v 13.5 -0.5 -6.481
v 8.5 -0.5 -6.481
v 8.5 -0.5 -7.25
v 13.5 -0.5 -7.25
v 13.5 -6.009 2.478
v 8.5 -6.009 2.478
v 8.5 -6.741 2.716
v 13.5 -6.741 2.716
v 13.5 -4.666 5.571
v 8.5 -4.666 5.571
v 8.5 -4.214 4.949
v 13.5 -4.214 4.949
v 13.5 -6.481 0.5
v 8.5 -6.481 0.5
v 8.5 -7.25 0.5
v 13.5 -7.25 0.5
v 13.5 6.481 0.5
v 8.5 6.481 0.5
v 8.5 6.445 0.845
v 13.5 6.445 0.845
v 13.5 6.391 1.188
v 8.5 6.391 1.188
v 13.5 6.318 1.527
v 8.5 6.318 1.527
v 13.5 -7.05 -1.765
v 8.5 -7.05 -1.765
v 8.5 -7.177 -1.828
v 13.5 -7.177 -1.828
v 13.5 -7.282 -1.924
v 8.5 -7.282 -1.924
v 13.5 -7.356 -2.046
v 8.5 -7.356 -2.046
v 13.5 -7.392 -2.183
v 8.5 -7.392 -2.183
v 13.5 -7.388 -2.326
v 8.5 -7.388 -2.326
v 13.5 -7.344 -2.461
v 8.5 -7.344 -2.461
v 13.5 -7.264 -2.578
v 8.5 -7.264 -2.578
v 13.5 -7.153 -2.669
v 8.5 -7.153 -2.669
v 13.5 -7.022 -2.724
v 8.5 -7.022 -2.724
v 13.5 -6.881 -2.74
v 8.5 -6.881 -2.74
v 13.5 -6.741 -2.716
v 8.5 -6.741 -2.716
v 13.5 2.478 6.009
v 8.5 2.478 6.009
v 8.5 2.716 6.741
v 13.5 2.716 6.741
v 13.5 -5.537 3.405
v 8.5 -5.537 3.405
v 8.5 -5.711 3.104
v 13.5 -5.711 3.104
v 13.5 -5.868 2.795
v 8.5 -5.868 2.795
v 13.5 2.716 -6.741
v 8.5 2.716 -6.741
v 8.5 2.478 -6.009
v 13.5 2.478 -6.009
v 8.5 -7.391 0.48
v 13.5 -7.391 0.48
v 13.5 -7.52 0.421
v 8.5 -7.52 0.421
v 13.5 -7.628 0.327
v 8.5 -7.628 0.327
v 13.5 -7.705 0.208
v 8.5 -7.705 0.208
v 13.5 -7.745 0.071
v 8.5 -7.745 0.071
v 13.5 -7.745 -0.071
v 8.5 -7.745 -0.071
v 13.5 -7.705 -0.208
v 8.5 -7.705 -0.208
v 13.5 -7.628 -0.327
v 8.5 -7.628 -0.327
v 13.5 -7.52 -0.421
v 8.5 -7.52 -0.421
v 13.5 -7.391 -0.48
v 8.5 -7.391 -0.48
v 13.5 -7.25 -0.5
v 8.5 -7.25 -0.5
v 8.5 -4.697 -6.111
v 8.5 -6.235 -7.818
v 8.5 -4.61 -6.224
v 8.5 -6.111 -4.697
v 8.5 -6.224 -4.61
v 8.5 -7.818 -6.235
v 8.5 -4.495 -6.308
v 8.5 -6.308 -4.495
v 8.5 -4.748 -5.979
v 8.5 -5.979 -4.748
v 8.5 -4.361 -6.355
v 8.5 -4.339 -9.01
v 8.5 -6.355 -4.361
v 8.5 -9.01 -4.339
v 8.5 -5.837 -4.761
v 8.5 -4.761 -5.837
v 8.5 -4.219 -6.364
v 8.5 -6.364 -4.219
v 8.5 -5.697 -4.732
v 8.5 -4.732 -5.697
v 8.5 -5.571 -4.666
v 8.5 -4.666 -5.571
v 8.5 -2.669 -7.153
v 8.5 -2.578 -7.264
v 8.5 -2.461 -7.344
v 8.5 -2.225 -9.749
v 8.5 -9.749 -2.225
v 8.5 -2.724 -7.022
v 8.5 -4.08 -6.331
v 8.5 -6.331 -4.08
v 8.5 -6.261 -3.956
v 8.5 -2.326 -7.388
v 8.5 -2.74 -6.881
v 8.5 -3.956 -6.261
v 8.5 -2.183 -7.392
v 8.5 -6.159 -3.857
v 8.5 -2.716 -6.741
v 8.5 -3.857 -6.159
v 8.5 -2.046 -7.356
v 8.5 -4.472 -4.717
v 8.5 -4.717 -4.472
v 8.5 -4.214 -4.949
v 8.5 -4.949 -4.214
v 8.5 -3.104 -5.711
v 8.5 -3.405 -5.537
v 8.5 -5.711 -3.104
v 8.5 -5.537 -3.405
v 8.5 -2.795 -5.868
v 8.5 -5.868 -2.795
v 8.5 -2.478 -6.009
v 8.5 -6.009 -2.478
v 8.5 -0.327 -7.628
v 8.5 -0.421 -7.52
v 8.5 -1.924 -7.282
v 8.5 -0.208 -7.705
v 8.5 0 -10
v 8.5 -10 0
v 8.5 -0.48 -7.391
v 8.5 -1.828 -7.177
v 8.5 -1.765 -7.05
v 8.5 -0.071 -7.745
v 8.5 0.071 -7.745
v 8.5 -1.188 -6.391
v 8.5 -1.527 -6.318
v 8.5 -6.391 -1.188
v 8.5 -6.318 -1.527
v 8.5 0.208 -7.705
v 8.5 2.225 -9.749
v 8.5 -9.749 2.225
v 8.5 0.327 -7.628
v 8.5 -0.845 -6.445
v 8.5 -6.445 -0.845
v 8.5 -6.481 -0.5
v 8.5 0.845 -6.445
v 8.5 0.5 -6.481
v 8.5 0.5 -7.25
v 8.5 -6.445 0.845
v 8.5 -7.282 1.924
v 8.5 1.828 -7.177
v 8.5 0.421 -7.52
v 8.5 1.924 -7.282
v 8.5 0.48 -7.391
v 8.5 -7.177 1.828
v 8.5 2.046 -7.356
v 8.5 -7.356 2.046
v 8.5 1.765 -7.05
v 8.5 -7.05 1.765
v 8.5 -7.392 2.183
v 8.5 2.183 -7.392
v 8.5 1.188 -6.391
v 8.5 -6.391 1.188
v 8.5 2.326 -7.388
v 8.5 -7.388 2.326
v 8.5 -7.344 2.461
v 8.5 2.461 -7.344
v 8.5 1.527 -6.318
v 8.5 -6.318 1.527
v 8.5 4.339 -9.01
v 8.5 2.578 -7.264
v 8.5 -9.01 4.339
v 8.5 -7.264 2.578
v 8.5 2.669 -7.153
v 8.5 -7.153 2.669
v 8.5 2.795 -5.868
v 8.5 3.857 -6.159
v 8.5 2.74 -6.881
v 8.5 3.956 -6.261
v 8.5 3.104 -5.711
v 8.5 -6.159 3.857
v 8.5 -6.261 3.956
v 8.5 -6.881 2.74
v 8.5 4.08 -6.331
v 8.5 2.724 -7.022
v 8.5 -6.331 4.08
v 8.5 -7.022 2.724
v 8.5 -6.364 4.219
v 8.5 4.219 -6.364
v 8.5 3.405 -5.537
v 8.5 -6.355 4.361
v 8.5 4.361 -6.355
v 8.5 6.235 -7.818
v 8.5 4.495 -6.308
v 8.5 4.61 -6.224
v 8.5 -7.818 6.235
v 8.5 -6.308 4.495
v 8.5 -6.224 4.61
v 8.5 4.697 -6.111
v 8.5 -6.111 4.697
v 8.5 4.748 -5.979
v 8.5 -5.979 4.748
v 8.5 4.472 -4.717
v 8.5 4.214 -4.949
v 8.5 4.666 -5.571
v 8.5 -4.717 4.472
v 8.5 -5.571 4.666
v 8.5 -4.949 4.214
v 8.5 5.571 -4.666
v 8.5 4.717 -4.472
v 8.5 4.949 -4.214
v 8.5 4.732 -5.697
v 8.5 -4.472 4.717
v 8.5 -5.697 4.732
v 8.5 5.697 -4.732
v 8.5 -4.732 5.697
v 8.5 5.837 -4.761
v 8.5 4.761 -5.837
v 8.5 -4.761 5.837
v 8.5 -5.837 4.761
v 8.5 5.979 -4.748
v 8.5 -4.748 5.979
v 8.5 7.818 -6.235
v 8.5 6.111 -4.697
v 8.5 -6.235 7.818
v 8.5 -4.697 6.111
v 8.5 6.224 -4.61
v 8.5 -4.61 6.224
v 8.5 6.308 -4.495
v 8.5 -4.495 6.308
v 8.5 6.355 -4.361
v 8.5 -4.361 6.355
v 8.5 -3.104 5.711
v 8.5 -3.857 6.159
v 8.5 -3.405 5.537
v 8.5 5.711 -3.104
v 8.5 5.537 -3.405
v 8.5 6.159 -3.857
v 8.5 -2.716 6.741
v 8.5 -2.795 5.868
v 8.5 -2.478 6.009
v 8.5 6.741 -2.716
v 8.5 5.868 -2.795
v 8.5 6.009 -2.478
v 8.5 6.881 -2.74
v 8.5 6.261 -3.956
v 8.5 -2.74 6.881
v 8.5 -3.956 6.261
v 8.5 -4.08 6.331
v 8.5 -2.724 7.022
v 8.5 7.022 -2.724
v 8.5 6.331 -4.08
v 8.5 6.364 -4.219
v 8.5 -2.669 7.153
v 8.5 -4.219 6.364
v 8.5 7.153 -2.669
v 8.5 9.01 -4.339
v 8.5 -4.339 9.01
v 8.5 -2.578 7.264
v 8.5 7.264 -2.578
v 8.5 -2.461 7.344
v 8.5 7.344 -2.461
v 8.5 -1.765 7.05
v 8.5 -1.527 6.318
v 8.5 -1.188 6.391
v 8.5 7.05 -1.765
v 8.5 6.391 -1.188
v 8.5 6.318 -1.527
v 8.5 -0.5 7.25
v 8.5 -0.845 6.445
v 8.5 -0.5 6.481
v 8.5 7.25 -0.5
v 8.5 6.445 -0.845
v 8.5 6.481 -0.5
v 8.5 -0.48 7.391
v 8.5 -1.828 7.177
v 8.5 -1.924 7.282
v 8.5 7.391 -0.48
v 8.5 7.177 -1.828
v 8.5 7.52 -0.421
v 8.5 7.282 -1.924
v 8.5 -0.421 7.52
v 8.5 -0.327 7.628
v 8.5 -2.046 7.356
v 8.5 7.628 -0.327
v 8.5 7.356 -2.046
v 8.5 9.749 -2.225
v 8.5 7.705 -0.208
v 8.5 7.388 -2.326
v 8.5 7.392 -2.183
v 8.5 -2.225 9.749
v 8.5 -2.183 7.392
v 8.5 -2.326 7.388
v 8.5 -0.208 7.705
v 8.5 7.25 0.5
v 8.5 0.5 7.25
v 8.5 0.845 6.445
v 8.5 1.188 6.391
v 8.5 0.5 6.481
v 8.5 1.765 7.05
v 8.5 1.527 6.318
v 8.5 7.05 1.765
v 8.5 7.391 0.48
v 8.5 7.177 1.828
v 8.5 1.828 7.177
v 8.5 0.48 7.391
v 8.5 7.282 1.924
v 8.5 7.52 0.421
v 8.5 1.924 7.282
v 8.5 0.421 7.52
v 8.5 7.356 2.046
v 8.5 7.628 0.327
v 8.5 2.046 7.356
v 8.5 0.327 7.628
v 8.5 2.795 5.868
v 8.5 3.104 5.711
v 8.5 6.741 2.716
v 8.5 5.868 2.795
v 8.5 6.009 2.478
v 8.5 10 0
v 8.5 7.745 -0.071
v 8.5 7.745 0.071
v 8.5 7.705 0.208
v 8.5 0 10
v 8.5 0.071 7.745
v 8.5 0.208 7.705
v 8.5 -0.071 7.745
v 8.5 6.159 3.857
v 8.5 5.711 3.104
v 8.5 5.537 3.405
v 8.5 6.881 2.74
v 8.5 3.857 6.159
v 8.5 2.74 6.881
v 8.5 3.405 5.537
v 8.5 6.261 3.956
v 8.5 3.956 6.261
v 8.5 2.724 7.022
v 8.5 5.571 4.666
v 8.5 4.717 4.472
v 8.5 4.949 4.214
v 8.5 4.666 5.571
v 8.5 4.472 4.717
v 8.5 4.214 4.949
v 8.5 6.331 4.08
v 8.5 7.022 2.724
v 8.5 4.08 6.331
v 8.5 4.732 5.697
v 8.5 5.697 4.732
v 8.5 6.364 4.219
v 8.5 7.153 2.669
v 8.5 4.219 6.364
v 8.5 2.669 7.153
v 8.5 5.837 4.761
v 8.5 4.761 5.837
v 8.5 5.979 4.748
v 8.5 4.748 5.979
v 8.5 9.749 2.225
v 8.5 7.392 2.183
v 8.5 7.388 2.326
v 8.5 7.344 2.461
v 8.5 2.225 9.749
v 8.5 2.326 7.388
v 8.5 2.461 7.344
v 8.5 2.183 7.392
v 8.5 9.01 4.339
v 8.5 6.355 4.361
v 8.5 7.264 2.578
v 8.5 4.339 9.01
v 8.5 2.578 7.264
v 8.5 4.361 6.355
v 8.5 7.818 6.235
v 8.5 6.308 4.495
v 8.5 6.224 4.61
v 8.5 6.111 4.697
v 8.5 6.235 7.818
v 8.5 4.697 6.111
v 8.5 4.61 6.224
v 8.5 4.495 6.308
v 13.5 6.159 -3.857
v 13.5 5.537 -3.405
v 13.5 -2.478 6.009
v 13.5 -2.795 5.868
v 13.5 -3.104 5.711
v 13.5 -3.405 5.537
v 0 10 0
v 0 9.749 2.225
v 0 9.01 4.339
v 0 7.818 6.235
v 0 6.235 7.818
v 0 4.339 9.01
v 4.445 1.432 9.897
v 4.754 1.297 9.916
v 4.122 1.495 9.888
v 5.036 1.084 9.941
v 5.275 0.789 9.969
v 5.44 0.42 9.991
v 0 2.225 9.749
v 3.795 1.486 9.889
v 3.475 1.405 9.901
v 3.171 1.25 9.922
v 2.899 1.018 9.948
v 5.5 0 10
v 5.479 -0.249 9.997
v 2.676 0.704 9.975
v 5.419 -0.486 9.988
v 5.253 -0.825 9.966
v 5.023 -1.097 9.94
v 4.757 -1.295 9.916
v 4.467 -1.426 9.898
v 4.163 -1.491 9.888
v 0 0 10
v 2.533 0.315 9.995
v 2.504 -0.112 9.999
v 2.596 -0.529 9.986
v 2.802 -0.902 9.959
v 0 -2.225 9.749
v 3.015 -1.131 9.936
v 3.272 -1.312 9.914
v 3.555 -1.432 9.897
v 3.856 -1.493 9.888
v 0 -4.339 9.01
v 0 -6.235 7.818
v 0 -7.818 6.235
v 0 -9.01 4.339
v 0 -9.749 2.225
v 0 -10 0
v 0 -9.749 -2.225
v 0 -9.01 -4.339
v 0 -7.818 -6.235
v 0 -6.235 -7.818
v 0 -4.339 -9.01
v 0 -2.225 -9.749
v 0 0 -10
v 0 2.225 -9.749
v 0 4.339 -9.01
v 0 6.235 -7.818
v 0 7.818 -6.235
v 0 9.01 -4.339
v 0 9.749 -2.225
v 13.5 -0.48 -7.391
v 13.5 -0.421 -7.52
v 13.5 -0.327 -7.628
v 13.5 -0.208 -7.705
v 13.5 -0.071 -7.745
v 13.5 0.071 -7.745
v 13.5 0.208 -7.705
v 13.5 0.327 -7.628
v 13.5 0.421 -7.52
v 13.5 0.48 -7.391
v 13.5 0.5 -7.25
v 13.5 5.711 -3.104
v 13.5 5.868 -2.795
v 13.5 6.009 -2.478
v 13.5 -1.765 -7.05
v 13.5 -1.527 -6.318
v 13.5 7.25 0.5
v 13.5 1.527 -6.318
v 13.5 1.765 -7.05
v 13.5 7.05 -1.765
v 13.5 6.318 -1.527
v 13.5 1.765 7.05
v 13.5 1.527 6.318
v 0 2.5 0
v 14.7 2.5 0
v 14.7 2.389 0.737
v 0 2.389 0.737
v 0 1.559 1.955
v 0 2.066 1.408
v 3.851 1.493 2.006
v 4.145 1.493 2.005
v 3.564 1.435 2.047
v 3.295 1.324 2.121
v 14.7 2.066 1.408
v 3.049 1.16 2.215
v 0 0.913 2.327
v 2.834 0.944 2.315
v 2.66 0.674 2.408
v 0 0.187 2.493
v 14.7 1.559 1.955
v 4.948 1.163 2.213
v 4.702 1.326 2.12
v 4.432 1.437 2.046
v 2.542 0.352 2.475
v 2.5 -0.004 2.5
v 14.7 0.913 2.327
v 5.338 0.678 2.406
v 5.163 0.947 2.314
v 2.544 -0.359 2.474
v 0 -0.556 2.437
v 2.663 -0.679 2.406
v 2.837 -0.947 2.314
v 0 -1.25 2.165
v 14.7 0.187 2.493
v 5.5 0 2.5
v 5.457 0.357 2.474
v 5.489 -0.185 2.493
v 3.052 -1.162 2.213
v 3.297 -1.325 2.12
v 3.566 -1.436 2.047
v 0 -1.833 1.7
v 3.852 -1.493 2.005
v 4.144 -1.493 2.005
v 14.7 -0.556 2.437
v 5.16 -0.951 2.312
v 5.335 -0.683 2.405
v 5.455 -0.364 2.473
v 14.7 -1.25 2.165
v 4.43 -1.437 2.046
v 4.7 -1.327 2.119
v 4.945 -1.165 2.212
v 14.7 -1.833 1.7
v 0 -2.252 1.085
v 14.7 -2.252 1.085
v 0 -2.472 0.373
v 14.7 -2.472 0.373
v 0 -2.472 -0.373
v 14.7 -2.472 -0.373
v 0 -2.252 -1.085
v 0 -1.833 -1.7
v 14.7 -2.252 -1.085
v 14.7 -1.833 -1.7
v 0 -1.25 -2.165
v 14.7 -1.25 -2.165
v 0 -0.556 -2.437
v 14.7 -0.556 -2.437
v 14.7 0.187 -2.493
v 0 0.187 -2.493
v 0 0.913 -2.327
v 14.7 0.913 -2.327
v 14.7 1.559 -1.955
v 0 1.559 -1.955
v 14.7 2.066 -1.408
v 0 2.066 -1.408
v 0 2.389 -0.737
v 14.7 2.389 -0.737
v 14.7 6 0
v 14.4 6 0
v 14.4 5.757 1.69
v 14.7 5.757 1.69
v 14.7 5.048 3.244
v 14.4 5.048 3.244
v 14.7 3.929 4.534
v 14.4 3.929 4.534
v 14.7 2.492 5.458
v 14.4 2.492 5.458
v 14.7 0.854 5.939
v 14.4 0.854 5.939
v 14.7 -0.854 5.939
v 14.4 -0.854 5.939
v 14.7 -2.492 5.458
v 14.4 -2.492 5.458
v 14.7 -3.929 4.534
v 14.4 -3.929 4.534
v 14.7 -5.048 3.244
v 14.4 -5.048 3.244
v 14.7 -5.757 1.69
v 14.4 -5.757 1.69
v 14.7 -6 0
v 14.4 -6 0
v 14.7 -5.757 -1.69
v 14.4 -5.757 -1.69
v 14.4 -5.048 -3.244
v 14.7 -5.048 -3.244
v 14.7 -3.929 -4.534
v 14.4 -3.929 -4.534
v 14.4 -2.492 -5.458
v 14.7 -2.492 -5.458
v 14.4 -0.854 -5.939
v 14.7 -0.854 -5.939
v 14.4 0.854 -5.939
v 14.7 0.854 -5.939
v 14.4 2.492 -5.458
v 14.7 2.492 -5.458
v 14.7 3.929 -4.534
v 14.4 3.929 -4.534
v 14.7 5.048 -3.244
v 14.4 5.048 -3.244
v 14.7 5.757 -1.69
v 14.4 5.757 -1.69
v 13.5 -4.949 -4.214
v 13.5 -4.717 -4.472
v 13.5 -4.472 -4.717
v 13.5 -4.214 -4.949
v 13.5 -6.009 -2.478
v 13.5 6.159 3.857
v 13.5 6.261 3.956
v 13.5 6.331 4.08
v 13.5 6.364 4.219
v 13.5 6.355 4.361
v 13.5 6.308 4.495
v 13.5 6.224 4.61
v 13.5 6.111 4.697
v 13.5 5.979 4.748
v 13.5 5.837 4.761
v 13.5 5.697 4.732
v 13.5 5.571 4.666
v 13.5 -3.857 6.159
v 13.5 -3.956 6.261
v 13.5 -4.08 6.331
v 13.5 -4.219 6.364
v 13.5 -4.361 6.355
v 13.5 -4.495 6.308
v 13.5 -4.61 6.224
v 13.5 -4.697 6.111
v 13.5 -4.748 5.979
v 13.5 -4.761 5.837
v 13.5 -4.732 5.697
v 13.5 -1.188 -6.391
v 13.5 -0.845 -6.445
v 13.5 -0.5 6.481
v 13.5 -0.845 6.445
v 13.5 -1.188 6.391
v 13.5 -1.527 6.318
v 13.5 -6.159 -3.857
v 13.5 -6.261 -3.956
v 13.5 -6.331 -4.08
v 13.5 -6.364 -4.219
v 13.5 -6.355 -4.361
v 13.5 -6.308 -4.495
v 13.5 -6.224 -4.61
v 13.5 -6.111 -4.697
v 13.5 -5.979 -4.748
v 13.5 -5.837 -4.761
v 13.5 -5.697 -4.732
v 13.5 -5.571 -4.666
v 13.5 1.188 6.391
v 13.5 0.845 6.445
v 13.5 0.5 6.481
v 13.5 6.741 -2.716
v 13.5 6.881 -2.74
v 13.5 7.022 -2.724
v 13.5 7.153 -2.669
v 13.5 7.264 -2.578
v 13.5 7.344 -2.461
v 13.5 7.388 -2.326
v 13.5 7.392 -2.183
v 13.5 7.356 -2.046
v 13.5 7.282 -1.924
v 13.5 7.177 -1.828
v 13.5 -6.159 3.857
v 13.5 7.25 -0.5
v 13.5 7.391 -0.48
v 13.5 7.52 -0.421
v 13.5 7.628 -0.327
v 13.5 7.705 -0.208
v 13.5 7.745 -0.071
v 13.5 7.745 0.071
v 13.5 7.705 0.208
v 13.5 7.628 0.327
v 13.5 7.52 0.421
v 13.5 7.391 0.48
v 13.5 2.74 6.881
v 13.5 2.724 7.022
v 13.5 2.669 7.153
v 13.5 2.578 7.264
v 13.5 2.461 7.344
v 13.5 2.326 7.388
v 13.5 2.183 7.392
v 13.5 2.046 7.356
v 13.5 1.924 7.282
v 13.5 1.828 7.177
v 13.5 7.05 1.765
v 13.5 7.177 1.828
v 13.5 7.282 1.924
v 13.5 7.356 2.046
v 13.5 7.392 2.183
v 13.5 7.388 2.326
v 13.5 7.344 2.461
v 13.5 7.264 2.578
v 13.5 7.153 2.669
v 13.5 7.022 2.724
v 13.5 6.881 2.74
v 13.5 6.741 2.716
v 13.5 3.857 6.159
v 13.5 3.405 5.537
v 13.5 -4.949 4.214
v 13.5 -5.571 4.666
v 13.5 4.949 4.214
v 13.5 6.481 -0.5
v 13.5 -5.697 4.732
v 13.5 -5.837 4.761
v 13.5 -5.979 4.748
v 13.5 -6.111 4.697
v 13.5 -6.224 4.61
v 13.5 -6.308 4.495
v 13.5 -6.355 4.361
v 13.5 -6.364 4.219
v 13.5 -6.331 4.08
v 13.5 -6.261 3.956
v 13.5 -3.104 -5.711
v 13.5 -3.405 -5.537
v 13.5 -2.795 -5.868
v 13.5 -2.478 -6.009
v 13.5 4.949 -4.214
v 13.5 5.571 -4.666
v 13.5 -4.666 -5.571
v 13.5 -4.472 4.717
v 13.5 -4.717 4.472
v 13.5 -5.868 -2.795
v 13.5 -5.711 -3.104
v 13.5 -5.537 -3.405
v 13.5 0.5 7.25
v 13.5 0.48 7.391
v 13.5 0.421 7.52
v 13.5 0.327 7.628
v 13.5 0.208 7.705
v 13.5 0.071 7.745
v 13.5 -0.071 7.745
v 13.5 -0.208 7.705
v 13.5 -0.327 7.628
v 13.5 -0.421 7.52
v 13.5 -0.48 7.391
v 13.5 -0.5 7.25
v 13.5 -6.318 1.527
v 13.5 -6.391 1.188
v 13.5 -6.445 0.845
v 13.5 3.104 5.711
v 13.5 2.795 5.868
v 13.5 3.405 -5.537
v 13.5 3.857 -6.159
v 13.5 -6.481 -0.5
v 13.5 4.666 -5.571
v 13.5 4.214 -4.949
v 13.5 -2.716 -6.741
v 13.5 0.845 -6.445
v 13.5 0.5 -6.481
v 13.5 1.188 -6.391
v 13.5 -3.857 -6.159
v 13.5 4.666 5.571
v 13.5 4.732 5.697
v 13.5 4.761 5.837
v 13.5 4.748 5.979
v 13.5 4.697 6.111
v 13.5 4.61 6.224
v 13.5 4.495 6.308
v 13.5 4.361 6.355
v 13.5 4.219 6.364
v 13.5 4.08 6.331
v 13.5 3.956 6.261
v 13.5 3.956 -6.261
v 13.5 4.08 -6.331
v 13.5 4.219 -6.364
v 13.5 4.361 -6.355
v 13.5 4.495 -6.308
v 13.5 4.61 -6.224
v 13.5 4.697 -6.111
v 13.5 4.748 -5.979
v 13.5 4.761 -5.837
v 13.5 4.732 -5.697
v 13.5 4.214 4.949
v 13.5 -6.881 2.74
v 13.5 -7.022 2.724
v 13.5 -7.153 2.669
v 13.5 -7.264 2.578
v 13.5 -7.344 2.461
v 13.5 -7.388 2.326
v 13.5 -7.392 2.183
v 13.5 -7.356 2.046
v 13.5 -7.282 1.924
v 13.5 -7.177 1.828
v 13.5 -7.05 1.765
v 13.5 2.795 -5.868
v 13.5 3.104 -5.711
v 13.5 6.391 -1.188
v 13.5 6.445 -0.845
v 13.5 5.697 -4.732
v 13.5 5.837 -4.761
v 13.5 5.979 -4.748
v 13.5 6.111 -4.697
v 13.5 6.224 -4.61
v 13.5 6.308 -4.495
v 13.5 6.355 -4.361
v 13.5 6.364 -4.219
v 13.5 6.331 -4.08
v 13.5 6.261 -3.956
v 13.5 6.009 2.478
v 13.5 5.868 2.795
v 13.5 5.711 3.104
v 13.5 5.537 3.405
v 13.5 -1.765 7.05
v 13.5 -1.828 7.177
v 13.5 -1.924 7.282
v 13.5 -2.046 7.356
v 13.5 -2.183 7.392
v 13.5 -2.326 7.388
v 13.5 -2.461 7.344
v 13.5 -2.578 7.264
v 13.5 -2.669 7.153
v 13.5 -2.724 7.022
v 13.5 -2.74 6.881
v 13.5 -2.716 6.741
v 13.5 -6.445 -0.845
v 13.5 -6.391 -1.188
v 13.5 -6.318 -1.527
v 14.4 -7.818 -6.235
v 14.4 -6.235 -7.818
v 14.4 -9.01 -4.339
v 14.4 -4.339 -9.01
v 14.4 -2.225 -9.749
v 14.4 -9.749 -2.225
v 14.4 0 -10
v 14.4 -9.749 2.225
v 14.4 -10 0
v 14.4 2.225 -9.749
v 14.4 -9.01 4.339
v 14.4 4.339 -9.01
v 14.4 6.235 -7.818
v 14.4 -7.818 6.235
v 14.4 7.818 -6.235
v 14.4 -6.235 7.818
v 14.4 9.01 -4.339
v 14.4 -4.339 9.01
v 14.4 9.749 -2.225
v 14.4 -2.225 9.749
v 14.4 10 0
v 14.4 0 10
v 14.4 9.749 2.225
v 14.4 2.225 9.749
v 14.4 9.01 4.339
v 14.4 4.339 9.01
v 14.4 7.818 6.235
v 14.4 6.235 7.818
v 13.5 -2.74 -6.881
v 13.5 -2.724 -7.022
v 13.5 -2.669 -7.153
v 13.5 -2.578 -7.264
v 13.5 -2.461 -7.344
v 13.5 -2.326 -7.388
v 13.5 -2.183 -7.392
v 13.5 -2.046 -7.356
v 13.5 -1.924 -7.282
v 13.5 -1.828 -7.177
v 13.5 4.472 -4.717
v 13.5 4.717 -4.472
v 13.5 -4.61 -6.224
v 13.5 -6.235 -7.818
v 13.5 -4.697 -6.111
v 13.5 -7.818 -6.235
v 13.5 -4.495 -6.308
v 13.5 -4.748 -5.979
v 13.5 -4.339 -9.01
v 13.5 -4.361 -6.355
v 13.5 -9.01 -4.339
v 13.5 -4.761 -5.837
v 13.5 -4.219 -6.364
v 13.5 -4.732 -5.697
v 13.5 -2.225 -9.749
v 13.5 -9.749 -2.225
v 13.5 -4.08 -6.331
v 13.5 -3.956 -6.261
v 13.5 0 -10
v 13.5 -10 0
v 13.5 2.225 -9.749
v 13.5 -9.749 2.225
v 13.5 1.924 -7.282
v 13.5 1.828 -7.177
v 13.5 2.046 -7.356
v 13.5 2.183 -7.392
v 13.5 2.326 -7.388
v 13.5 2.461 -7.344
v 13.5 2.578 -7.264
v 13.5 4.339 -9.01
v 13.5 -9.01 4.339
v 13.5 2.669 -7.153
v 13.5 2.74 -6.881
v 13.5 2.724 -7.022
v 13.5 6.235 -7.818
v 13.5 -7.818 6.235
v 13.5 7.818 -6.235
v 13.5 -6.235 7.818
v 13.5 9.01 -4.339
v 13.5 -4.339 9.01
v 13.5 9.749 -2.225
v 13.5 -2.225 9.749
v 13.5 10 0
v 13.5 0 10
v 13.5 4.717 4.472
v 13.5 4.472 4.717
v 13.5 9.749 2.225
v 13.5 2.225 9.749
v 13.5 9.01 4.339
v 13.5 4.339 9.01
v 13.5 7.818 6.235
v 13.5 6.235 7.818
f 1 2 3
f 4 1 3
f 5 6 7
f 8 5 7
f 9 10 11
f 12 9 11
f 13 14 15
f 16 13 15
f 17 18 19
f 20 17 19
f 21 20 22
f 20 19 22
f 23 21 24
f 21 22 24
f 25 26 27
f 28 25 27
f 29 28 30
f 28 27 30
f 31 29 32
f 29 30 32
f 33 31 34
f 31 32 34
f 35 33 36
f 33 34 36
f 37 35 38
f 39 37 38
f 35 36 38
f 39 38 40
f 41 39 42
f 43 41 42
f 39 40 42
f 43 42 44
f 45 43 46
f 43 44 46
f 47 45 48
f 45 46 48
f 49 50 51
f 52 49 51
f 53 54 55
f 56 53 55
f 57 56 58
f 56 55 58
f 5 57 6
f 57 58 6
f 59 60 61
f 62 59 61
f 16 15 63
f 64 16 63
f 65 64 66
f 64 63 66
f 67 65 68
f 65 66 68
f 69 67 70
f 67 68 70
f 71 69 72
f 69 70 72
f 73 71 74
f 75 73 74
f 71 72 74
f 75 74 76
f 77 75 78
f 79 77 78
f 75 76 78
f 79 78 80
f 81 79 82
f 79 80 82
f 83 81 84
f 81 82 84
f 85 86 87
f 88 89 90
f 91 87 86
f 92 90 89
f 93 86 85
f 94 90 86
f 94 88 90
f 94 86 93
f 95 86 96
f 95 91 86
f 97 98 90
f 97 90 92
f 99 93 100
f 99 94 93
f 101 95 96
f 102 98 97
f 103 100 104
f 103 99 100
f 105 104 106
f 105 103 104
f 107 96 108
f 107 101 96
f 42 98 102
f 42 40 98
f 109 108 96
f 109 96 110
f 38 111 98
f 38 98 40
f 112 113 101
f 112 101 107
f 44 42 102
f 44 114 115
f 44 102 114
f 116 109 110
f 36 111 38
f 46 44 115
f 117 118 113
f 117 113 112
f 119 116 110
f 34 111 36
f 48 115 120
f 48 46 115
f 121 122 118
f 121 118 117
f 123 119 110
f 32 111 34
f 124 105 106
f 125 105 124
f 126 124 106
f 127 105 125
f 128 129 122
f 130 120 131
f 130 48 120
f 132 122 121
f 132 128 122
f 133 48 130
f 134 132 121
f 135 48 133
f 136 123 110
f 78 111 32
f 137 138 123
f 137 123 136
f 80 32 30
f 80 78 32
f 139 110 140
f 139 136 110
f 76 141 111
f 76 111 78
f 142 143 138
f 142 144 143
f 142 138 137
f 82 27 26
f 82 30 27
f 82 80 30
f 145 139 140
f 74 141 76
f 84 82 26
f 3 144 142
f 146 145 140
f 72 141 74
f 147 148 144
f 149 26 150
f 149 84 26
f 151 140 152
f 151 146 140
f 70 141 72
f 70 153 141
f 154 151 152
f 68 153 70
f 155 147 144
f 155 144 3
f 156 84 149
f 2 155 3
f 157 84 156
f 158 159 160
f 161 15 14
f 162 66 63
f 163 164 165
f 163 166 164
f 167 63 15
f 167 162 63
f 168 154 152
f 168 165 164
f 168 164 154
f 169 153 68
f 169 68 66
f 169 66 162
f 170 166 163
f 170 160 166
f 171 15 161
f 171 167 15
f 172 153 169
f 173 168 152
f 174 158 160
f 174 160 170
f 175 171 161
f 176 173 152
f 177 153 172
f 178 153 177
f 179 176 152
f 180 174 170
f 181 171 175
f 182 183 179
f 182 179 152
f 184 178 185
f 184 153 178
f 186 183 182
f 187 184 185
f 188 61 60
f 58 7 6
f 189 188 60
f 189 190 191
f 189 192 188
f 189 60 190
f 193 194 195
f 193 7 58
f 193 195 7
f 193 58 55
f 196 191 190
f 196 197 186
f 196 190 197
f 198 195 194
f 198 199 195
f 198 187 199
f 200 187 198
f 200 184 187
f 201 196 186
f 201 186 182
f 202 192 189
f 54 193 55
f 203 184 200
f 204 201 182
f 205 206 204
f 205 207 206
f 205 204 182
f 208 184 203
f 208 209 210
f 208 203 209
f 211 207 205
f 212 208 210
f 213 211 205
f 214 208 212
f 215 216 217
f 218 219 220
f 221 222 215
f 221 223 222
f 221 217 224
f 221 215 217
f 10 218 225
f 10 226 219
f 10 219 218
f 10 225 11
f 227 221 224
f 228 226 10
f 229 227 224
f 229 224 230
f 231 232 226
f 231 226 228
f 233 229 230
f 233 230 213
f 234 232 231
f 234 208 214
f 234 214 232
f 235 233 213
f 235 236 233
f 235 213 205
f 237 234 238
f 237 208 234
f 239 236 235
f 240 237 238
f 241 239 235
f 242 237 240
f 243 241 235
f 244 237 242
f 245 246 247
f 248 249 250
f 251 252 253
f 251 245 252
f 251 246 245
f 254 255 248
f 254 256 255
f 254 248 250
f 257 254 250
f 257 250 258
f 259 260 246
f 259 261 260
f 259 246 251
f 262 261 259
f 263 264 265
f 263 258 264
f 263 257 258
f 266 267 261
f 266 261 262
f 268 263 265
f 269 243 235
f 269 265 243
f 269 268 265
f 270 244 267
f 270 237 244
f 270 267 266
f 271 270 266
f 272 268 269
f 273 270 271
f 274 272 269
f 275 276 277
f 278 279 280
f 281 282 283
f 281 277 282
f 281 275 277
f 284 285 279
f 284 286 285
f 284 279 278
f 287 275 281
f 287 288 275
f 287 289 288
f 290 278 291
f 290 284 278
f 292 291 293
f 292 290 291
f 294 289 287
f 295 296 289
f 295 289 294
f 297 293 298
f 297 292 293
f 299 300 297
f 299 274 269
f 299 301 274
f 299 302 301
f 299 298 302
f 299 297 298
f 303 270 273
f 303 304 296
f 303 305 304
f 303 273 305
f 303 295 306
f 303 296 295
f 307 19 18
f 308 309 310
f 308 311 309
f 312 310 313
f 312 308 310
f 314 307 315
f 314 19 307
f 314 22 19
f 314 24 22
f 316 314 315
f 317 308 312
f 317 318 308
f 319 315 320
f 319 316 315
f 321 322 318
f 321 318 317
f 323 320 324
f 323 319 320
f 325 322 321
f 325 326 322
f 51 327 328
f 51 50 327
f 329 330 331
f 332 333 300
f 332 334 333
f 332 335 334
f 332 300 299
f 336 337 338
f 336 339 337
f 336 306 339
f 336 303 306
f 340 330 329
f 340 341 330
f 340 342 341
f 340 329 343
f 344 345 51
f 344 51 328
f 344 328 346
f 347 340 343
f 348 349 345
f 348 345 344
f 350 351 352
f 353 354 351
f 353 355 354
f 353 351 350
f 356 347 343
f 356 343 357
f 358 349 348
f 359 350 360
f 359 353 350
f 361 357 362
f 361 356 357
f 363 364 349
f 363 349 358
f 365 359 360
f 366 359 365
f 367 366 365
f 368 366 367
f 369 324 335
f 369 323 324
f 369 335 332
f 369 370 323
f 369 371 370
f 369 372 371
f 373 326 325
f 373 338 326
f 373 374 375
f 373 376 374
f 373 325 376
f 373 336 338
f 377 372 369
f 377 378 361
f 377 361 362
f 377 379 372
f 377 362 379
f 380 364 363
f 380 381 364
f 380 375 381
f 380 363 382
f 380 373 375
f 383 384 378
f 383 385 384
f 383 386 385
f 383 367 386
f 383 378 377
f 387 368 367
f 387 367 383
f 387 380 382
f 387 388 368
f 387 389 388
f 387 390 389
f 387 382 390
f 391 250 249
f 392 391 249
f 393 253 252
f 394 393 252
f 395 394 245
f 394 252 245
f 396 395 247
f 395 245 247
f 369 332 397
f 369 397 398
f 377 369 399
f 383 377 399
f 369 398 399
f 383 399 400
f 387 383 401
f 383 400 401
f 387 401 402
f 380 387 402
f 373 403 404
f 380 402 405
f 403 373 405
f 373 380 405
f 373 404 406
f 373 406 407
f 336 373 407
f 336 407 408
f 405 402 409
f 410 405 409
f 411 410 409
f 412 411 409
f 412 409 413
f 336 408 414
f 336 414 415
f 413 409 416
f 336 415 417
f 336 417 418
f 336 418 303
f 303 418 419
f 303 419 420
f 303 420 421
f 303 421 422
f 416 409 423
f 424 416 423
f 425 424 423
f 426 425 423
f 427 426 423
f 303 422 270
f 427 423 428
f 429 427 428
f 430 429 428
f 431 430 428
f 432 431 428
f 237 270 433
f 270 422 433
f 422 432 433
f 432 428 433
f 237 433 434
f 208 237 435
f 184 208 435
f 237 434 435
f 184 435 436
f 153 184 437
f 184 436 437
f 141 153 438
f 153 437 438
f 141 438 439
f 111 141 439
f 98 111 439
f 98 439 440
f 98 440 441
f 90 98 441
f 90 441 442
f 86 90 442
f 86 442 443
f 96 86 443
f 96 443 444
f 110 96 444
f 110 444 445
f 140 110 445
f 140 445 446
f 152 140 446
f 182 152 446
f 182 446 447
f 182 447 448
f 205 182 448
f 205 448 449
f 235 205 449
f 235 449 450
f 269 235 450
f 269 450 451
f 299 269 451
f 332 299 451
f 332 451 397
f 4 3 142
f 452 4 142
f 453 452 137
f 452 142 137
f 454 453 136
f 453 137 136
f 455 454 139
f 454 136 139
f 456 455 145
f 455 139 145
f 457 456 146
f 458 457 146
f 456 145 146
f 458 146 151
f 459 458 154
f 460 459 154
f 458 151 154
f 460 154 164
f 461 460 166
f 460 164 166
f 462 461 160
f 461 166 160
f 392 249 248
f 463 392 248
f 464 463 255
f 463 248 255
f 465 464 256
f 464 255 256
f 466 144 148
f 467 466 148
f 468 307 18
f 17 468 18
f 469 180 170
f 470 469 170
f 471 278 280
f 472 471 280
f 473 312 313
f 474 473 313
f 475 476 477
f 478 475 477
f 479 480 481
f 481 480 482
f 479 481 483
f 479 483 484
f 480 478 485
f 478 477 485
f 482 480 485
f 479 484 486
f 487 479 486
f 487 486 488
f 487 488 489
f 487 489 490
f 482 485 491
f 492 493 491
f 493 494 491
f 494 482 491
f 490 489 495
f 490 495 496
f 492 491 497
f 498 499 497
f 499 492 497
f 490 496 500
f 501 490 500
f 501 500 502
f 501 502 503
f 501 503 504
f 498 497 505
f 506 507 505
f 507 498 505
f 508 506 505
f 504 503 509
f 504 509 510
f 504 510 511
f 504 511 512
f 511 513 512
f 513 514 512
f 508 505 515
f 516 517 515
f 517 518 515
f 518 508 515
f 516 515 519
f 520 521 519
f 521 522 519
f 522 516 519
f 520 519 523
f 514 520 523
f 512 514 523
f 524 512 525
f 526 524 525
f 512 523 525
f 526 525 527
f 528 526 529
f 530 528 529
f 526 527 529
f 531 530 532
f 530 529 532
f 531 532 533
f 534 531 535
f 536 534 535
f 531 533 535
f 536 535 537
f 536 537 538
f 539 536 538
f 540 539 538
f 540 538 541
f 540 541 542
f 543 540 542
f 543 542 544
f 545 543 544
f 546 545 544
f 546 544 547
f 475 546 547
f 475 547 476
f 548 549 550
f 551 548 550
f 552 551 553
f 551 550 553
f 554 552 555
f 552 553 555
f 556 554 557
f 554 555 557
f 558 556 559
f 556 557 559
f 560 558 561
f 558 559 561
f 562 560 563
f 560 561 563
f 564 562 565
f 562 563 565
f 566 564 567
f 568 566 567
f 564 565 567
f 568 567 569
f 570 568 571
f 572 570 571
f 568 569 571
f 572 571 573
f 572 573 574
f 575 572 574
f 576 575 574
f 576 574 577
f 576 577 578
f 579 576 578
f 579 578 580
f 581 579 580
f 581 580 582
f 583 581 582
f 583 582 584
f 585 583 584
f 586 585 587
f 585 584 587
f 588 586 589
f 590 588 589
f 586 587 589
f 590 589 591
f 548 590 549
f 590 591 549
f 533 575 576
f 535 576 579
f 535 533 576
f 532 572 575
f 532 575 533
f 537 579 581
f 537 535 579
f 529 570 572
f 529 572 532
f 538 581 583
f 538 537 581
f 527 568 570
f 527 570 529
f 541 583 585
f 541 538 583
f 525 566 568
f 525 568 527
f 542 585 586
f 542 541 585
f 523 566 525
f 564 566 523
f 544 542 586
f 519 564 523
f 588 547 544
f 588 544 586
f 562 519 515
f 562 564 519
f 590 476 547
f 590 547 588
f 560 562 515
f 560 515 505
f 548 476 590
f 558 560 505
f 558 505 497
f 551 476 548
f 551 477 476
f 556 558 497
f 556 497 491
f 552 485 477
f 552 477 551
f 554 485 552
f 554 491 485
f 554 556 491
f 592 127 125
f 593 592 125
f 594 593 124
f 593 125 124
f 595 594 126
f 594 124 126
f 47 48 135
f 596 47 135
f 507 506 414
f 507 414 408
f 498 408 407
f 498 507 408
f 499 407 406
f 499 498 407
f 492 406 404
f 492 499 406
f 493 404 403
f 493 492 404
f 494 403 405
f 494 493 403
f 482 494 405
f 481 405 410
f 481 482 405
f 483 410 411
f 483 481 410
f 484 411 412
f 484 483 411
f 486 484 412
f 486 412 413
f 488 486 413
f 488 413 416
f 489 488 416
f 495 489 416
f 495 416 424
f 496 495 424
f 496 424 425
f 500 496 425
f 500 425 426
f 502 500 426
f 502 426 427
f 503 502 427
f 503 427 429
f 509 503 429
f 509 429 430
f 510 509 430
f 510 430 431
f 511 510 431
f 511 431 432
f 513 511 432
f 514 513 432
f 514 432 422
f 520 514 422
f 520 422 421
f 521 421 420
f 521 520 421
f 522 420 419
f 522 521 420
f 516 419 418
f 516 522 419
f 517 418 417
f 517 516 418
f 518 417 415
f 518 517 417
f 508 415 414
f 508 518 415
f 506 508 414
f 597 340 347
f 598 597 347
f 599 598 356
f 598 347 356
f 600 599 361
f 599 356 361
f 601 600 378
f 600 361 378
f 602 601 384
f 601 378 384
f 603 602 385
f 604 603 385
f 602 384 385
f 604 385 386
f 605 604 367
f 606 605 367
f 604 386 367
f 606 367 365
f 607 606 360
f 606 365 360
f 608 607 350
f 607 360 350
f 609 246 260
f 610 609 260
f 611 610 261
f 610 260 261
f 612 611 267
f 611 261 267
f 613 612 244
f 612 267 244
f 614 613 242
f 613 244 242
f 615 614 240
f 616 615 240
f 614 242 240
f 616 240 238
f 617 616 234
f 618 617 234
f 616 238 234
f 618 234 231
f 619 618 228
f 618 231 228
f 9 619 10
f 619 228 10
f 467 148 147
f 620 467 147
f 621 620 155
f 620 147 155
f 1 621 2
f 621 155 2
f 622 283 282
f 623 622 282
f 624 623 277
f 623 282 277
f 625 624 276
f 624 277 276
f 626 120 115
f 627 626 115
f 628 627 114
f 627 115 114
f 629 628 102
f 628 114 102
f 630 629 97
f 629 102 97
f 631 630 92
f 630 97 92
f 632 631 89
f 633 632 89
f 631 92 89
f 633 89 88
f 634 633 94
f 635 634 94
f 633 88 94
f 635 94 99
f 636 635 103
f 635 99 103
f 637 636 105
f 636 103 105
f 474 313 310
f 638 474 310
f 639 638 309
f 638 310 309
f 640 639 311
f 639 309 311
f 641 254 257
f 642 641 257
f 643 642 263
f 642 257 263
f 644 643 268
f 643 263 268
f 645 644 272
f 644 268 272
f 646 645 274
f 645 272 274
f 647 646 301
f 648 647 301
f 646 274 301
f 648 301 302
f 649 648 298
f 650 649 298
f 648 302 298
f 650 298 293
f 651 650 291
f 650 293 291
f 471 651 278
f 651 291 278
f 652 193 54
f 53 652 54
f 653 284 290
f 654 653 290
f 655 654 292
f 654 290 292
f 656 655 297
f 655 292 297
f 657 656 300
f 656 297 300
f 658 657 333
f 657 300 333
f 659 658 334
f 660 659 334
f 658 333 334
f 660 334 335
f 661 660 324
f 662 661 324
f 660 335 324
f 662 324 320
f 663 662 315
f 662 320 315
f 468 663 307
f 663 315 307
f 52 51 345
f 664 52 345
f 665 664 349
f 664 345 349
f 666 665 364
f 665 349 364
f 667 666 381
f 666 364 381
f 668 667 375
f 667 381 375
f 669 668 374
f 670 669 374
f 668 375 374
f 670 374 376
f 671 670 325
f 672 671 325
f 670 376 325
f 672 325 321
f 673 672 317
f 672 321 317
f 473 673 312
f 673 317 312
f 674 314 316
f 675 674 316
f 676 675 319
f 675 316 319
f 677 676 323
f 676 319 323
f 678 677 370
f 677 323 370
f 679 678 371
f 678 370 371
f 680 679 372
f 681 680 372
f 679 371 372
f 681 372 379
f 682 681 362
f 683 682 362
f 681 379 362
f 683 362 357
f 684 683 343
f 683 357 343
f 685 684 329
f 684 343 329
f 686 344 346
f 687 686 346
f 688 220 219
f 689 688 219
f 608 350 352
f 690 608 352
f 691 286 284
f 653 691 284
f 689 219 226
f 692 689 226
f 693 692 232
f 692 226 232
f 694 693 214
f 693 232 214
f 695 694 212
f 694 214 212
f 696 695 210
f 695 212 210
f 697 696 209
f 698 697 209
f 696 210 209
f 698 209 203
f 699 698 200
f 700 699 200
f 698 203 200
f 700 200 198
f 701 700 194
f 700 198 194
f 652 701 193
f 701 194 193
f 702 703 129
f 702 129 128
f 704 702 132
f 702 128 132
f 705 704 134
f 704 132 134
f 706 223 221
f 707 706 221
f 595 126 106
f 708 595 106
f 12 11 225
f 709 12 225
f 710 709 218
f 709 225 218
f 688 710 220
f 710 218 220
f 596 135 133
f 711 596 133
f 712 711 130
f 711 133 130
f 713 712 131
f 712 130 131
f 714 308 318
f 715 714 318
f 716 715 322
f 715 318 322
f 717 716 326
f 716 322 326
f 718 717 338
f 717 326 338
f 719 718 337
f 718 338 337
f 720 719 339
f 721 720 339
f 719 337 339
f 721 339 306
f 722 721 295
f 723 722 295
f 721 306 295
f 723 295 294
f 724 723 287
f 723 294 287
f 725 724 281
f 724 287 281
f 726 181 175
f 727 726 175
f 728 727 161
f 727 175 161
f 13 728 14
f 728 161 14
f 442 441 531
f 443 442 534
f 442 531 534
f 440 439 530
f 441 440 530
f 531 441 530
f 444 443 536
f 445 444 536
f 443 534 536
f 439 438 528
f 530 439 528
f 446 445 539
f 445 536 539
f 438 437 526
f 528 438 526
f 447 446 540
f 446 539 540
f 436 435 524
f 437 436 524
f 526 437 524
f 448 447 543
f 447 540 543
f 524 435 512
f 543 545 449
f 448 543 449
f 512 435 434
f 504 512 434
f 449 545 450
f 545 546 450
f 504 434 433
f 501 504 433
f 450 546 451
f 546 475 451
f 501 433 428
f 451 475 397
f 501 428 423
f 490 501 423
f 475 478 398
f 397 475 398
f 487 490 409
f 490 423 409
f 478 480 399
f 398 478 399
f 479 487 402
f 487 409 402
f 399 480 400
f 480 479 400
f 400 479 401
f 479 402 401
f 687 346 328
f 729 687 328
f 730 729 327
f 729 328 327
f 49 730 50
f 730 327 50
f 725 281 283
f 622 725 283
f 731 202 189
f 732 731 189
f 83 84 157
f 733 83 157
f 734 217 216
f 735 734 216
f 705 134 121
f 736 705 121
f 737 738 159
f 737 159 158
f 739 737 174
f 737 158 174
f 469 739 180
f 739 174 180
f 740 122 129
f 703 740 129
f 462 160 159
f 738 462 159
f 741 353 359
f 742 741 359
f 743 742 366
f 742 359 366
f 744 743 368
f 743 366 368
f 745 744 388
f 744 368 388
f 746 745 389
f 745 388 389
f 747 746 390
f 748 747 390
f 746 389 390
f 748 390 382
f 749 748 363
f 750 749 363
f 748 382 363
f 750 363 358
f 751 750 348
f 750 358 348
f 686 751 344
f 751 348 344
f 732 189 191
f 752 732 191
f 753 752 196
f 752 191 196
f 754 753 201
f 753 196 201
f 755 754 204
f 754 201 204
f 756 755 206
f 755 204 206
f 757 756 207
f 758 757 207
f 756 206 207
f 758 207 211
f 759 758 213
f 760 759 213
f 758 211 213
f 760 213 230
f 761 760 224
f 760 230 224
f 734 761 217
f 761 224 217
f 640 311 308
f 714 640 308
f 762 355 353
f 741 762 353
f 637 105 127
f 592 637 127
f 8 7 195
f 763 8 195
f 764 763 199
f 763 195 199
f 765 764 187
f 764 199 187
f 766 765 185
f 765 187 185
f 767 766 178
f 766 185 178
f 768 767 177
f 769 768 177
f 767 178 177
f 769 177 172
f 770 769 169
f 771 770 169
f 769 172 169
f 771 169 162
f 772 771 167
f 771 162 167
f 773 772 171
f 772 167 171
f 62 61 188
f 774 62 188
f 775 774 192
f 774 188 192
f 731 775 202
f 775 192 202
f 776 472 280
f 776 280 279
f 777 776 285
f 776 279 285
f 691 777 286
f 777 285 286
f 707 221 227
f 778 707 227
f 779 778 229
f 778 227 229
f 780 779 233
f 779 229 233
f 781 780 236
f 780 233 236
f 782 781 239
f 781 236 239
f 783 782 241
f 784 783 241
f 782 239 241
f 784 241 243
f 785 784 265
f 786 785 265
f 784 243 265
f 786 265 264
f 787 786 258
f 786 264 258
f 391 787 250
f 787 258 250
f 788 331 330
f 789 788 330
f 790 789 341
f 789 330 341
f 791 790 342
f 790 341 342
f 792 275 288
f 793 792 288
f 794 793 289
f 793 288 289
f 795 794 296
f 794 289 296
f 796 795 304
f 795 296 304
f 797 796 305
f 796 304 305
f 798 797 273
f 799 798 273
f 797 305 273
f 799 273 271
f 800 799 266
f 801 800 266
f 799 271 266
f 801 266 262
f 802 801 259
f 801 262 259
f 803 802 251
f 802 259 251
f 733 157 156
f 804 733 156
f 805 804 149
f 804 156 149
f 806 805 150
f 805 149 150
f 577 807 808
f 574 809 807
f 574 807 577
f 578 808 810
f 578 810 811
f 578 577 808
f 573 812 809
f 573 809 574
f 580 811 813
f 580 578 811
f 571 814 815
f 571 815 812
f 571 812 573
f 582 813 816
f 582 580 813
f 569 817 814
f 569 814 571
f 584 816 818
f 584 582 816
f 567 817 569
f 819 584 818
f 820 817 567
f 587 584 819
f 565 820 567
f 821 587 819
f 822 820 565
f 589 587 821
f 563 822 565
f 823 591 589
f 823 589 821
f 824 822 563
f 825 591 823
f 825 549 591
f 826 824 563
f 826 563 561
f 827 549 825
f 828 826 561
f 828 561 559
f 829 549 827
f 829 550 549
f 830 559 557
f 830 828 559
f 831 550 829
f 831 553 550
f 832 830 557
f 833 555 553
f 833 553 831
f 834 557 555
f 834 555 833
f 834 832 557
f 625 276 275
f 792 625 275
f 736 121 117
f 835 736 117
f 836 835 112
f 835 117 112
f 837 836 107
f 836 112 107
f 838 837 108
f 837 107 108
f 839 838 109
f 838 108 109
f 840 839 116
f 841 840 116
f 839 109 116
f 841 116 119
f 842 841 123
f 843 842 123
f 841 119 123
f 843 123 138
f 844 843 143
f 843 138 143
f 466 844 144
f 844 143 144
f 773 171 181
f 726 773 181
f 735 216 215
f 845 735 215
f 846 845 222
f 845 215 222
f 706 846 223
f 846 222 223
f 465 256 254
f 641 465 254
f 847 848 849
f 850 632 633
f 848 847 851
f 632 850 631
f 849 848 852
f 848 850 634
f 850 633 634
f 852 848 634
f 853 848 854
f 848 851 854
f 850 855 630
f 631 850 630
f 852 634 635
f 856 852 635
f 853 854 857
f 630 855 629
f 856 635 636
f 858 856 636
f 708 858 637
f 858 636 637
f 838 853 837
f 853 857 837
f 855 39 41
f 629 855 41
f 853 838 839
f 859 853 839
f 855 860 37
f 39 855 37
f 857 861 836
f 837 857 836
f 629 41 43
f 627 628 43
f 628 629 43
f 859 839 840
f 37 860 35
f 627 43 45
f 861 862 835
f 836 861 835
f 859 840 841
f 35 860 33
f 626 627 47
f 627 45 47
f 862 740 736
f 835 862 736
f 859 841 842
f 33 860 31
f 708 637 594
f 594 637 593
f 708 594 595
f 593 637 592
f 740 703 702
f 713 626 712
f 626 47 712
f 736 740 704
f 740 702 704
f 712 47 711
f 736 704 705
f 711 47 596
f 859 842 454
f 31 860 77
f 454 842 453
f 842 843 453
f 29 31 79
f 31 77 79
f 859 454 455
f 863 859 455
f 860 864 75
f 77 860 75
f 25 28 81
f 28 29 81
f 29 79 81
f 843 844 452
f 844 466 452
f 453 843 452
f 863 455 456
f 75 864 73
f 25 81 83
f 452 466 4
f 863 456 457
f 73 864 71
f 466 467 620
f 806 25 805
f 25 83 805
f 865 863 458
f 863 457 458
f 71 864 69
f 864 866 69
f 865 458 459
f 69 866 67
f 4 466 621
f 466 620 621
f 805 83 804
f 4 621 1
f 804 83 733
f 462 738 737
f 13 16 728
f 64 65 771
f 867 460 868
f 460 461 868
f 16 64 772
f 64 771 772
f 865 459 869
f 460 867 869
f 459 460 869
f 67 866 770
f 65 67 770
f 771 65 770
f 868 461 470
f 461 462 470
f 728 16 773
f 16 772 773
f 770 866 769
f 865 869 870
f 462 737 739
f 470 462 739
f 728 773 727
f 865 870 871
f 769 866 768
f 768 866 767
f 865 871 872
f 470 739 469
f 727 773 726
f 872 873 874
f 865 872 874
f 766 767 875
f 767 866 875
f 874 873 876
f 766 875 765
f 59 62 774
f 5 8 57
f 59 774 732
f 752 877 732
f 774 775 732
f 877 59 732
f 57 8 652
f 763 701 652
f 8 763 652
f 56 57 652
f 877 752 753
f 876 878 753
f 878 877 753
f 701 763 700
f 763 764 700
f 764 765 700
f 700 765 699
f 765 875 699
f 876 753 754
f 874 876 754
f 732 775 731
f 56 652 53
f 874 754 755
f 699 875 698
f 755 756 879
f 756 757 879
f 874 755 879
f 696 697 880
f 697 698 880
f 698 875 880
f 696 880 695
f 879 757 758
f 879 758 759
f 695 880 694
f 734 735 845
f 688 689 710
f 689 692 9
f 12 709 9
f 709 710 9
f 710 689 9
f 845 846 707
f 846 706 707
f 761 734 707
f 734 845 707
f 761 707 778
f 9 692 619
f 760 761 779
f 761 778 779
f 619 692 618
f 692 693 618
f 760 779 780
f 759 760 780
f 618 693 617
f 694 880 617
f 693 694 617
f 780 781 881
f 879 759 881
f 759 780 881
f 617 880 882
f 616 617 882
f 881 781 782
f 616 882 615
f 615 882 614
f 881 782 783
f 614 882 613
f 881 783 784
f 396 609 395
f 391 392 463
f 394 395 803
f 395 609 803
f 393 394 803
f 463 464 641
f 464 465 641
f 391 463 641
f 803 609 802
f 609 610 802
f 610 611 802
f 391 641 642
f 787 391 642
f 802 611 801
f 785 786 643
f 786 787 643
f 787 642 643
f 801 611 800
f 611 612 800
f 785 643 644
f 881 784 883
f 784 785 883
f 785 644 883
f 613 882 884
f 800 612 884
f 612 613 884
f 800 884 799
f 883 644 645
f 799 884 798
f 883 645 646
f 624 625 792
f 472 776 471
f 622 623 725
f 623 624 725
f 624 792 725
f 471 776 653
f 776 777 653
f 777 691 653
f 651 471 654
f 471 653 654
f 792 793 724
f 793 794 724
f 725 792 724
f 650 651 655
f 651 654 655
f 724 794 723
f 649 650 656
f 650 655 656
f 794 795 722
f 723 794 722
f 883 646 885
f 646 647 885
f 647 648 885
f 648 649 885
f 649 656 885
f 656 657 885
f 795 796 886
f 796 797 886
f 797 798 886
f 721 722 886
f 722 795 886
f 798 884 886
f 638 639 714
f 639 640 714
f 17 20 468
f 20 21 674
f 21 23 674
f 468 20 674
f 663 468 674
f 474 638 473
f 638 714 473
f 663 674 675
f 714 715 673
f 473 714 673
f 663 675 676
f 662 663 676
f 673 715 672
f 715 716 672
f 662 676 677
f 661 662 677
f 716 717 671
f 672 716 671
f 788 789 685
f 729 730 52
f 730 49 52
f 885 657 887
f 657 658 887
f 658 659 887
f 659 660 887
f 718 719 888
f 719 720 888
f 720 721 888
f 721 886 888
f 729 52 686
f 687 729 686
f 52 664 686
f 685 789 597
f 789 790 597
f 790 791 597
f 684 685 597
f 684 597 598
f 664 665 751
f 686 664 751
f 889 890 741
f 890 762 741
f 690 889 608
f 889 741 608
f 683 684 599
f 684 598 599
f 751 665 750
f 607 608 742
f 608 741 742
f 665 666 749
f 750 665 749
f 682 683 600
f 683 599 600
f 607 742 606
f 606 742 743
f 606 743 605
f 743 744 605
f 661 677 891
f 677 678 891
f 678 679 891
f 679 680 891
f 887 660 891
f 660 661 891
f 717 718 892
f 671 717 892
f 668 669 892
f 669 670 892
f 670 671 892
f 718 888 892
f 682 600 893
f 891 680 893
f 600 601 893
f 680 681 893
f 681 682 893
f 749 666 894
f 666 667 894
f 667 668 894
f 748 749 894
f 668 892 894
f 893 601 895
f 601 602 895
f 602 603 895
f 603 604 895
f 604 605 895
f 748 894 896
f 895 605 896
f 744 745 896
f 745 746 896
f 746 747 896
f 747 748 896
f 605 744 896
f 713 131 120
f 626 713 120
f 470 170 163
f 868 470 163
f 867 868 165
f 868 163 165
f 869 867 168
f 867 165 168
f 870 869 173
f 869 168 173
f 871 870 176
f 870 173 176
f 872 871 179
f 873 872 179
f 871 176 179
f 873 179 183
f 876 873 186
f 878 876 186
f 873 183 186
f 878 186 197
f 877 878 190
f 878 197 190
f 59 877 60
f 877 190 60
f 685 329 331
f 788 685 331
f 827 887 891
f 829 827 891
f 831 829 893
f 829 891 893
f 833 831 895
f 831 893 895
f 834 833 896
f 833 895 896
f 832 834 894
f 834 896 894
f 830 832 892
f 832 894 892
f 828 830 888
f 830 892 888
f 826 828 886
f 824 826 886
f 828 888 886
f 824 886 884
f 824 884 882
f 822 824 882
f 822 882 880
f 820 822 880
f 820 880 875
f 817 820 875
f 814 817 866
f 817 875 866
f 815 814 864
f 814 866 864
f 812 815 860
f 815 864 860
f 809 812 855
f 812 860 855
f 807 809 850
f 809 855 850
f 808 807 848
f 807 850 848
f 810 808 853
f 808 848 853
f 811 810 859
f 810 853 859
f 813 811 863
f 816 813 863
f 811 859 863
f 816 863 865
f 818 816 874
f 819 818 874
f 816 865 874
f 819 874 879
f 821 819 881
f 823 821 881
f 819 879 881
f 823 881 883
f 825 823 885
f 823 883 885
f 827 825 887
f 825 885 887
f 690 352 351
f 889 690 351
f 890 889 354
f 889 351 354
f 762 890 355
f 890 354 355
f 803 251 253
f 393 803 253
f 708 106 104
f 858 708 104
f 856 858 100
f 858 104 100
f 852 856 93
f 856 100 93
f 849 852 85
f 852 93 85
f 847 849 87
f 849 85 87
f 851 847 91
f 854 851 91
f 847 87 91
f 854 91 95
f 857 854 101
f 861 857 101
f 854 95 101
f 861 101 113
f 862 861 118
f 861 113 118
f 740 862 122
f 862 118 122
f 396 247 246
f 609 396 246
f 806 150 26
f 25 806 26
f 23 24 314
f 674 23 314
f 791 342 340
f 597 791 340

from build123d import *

# Parameters (mm, degrees)
F0_R            = 10
F1_DEPTH        = 8.5
F3_DEPTH        = 5
F3_COPIES_COUNT = 20
F5_R            = 10
F6_DEPTH        = 0.9
F7_R            = 6
F8_DEPTH        = 0.3
F9_R            = 2.5
F10_DEPTH       = 14.7
F11_R           = 1.5
F12_REACH       = 14.2436406871


# Not quite as in the source:
# - a pattern or mirror of a feature is missing from the dataset's text; its kind, count and spacing are read off the source's solid


with BuildPart() as f1:
    # F0 (on Right) → F1 (new body)
    with BuildSketch(Plane.YZ):
        Circle(F0_R)
    extrude(amount=F1_DEPTH)

    # F2 (on face) → F3 (join)
    with BuildSketch(Plane.YZ.offset(8.5)):
        with BuildLine():
            Line((0.5, 6.4807406984), (0.5, 7.25))
            ThreePointArc((0.5, 7.25), (0, 7.75), (-0.5, 7.25))
            Line((-0.5, 7.25), (-0.5, 6.4807406984))
            ThreePointArc((-0.5, 6.4807406984), (0, -6.5), (0.5, 6.4807406984))
        make_face()
    f3 = extrude(amount=F3_DEPTH)

    # F3_copies: F3 ×20 about axis
    f3_copies_axis = Axis((0, 0, 0), (1, 0, 0))
    for i in range(1, F3_COPIES_COUNT):
        add(f3.rotate(f3_copies_axis, i * 360 / F3_COPIES_COUNT))

    # F5 (on face) → F6 (join)
    with BuildSketch(Plane.YZ.offset(13.5)):
        Circle(F5_R)
    extrude(amount=F6_DEPTH)

    # F7 (on face) → F8 (join)
    with BuildSketch(Plane.YZ.offset(14.4)):
        Circle(F7_R)
    extrude(amount=F8_DEPTH)

    # F9 (on face) → F10 (cut, through all)
    with BuildSketch(Plane.YZ.offset(14.7)):
        Circle(F9_R)
    extrude(amount=-F10_DEPTH, mode=Mode.SUBTRACT)

    f12_end = f1.faces().sort_by_distance((4.25, -10, 0))[0]
    # F11 (on Top) → F12 (cut, up to a face of the model that its end follows)
    with BuildSketch(Plane.XY):
        with Locations((4, 0)):
            Circle(F11_R)
    f12_long = extrude(amount=F12_REACH, mode=Mode.PRIVATE)
    add(split(f12_long, bisect_by=f12_end, keep=Keep.BOTTOM, mode=Mode.PRIVATE), mode=Mode.SUBTRACT)


solid = f1.part
